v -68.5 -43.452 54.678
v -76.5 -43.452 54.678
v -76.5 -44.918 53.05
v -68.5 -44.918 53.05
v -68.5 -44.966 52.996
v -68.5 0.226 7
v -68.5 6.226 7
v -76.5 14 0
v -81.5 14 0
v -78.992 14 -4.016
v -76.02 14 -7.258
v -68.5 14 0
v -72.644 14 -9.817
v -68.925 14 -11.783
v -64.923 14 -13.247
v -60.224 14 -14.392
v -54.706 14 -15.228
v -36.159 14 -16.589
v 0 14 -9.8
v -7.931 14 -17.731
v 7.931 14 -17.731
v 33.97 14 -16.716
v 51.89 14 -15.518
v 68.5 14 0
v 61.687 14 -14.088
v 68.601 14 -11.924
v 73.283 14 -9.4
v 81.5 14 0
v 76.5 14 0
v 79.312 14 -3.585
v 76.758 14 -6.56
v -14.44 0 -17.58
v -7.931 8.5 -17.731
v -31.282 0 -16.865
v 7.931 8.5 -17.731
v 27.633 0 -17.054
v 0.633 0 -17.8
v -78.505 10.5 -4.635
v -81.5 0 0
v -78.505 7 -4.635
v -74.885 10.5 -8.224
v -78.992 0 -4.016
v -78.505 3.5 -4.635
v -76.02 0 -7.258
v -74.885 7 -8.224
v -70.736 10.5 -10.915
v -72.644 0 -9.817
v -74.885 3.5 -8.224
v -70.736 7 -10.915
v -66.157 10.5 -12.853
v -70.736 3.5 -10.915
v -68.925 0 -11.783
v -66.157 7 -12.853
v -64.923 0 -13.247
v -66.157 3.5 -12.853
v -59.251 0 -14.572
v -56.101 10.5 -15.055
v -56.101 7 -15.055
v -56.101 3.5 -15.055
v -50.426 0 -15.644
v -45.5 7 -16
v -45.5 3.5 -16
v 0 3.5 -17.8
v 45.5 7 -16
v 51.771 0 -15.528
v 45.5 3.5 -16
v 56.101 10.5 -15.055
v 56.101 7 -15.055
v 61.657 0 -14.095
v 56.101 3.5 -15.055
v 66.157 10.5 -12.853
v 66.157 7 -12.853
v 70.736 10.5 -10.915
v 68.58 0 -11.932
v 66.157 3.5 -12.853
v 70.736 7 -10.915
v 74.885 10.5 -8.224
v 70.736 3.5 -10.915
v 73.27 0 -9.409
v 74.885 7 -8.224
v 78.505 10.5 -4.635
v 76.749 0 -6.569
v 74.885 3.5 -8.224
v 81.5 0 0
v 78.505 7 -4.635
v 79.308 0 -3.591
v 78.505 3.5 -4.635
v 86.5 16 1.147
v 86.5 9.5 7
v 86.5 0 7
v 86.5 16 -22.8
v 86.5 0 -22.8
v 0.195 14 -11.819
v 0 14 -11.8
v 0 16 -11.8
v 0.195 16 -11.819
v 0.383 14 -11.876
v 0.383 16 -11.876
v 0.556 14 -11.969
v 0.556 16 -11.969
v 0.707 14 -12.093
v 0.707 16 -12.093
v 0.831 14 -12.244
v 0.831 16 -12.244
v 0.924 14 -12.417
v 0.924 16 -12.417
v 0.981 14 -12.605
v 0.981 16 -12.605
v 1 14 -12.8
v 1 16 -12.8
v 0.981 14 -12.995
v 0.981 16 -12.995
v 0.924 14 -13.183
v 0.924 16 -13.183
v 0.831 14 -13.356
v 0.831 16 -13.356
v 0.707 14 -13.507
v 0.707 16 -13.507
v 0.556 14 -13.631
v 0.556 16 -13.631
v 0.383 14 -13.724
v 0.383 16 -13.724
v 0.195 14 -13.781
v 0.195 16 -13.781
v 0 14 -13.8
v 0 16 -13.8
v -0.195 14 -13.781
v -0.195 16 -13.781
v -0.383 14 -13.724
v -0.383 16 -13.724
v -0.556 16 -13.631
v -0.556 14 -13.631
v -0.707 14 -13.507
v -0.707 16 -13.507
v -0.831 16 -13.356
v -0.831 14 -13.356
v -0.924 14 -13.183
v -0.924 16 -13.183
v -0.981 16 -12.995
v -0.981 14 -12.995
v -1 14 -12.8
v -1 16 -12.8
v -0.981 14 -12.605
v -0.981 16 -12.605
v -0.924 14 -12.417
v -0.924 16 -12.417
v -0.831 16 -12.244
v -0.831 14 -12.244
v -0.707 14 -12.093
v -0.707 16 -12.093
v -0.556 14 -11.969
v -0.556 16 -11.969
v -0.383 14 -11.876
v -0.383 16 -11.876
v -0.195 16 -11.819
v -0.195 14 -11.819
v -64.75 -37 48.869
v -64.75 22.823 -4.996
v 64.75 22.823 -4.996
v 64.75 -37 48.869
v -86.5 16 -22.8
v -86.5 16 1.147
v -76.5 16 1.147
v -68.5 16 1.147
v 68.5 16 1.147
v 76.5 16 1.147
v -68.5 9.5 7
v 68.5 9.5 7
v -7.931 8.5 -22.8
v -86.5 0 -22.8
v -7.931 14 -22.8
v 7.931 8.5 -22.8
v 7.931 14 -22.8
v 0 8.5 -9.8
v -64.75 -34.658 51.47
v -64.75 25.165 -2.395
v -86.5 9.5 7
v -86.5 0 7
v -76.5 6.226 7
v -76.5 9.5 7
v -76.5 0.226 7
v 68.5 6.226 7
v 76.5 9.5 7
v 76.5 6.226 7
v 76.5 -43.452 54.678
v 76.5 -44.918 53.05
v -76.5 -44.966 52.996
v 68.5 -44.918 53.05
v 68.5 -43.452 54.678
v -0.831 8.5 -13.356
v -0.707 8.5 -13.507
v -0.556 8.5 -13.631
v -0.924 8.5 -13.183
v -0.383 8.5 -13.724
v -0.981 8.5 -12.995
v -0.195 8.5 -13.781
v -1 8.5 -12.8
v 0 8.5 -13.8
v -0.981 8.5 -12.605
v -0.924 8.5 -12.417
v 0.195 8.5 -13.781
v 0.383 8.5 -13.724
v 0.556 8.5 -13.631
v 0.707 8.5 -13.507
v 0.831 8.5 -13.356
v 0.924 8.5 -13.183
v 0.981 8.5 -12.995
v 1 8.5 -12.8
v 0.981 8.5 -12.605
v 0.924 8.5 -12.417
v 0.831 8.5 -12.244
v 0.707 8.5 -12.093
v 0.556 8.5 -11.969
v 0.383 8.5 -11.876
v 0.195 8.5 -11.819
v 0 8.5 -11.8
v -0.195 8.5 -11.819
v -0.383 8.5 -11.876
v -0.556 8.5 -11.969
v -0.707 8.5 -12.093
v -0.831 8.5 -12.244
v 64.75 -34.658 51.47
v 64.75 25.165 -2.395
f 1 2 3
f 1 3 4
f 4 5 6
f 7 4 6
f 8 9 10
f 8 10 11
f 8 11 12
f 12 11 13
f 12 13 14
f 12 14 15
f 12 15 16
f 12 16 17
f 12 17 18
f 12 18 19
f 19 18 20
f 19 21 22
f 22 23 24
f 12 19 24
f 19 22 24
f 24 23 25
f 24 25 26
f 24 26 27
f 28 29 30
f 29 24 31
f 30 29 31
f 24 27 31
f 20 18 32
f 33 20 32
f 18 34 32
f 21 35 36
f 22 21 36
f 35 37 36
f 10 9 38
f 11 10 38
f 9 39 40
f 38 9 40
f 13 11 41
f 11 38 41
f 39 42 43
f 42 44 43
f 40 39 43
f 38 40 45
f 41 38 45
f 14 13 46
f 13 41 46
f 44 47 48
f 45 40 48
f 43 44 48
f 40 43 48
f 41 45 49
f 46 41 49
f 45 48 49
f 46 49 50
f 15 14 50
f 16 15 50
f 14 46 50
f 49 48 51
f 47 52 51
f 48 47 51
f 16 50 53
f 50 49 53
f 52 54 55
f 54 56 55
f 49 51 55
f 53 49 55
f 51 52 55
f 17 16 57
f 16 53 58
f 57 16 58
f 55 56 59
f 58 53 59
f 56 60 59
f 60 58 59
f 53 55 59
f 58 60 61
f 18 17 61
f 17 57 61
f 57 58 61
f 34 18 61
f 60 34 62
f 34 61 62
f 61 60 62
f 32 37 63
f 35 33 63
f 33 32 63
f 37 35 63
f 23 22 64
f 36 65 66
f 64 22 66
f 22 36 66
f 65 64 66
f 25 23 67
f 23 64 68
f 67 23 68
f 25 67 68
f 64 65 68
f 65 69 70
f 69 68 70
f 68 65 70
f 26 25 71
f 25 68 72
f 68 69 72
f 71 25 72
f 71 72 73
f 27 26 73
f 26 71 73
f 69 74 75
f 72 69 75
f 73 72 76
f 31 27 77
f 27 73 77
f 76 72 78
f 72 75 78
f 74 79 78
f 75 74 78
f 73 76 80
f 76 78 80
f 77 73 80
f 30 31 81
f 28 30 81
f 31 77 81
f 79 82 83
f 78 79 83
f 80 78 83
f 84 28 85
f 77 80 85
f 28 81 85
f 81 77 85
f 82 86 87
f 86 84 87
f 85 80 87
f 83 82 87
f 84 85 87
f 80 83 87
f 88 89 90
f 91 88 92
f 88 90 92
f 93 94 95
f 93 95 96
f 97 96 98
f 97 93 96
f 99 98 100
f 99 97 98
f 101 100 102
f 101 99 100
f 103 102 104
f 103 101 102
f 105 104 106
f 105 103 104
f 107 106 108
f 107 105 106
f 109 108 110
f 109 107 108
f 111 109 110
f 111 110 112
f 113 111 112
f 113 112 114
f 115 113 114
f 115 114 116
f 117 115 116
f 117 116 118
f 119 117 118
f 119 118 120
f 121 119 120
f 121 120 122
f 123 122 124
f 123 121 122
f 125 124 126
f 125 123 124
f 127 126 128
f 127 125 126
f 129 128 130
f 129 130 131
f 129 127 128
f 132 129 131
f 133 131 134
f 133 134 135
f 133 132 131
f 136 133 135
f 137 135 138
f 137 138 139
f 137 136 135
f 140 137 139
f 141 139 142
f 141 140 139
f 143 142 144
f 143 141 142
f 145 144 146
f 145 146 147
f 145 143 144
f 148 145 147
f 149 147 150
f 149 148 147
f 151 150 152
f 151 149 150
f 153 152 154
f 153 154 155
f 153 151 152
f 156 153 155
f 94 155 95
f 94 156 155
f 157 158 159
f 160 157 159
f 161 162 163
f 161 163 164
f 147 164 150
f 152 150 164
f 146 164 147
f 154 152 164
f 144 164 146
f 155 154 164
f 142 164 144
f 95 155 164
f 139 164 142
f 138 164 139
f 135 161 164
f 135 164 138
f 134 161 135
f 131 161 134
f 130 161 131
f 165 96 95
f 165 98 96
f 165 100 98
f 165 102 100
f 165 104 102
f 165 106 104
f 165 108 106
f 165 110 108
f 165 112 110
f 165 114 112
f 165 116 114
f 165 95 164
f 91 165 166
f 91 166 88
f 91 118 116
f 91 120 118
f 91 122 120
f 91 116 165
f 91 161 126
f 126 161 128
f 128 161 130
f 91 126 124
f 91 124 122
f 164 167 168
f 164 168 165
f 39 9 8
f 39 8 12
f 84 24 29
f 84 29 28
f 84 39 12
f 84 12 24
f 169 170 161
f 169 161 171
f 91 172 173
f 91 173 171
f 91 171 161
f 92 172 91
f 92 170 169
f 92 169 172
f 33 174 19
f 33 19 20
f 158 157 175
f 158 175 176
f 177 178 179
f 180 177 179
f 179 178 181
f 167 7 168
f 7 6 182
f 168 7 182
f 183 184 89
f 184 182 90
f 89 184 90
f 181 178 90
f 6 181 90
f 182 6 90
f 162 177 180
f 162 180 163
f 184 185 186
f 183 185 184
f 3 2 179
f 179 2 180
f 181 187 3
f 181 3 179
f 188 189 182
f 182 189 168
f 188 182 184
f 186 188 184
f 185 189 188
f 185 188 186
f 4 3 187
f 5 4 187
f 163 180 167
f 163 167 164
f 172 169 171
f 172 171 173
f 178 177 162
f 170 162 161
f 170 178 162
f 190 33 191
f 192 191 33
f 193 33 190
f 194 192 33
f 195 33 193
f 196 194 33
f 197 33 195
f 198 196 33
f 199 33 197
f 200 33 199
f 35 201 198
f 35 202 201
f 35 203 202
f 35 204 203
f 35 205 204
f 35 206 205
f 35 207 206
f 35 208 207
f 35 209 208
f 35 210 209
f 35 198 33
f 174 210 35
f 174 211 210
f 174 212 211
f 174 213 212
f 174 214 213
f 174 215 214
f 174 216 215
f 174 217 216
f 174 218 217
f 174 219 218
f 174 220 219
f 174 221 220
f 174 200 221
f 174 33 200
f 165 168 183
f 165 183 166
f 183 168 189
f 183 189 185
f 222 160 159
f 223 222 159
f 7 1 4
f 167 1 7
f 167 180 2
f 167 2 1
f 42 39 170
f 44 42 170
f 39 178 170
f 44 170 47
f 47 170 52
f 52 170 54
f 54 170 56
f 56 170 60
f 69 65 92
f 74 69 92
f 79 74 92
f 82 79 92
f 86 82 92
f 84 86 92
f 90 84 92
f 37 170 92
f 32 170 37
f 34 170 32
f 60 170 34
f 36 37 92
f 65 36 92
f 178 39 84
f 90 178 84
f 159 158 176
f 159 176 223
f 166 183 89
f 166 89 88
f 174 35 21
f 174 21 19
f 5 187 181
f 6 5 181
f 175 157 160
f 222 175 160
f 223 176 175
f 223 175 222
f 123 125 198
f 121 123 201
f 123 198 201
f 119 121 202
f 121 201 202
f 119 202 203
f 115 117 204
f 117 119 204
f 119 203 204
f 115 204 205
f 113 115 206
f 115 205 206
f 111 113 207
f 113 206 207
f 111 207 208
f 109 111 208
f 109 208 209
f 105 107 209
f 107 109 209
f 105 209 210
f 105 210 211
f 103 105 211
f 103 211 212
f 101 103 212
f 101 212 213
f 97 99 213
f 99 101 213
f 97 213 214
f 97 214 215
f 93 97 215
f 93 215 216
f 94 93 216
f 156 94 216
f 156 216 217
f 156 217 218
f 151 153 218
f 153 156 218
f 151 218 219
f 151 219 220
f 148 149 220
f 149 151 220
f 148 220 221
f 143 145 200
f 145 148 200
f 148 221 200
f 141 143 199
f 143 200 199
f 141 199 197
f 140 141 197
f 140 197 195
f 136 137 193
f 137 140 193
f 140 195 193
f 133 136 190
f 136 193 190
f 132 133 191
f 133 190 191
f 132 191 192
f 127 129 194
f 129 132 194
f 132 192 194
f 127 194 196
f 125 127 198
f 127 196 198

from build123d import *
from build123d.topology import SkipClean

# Parameters (mm, degrees)
SKETCH2_W               = 173
SKETCH2_H               = 29.8
BOSS_EXTRUDE1_DEPTH     = 14
SKETCH4_W               = 173
SKETCH4_H               = 29.8
SKETCH4_R               = 1
BOSS_EXTRUDE3_DEPTH     = 2
BOSS_EXTRUDE4_START     = 5.5
SKETCH5_R               = 1
BOSS_EXTRUDE4_DEPTH     = 5.5
CUT_EXTRUDE1_DEPTH      = 91.874033815
CUT_EXTRUDE1_DEPTH_BACK = 91.874033815
SKETCH7_W               = 129.5
SKETCH7_H               = 80.5
BOSS_EXTRUDE5_DEPTH     = 3.5
SKETCH8_W               = 8
SKETCH8_H               = 80
BOSS_EXTRUDE6_DEPTH     = 2.190926
CHAMFER1_START          = -76.5
CHAMFER1_DEPTH          = 8


with BuildPart() as part:
    # Sketch2 → Boss-Extrude1 (new body)
    with BuildSketch(Plane(origin=(0, 0, 0), x_dir=(1, 0, 0), z_dir=(0, 1, 0))):
        with Locations((0, 7.9)):
            Rectangle(SKETCH2_W, SKETCH2_H)
        with BuildLine():
            Line((-81.5, 0), (81.5, 0))
            add(Edge.make_bspline(
                [(-81.5, 0), (-74.436091259, 13.881927863), (-43.259356961, 16.362188276), (0, 18.555927536), (43.259356961, 16.362188276), (74.436091259, 13.881927863), (81.5, 0)],
                knots=[0, 0, 0, 0, 0.237125688, 0.5, 0.762874312, 1, 1, 1, 1], degree=3))
        make_face(mode=Mode.SUBTRACT)
    extrude(amount=BOSS_EXTRUDE1_DEPTH)

    # Sketch4 → Boss-Extrude3 (add)
    with BuildSketch(Plane(origin=(0, 14, 0), x_dir=(1, 0, 0), z_dir=(0, 1, 0))):
        with Locations((0, 7.9)):
            Rectangle(SKETCH4_W, SKETCH4_H)
        with Locations(Location((0, 12.8, 0), (0, 0, 270))):
            Circle(SKETCH4_R, mode=Mode.SUBTRACT)
    extrude(amount=BOSS_EXTRUDE3_DEPTH)

    # Sketch5 → Boss-Extrude4 (add)
    with SkipClean():  # the faces are left unmerged after this step: merging them gives an invalid solid
        with BuildSketch(Plane.XZ.offset(-14).offset(BOSS_EXTRUDE4_START)):
            Polygon((0, -9.8), (-7.931348641, -17.731348641), (-7.931348641, -22.8), (7.931348641, -22.8), (7.931348641, -17.731348641), align=None)
            with Locations(Location((0, -12.8, 0), (0, 0, 270))):
                Circle(SKETCH5_R, mode=Mode.SUBTRACT)
        extrude(amount=-BOSS_EXTRUDE4_DEPTH)

    # Sketch3 → Cut-Extrude1 (cut, two sides: drawn at the far end of the back side and taken through both)
    with SkipClean():  # the faces are left unmerged after this step: merging them gives an invalid solid
        with BuildSketch(Plane(origin=(0, 0, 0), x_dir=(0, 0, -1), z_dir=(1, 0, 0)).offset(-CUT_EXTRUDE1_DEPTH_BACK)):
            Polygon((-48.86878806, -37), (4.996225752, 22.823158451), (1.280501625, 26.168811483), (-52.584512187, -33.654346968), align=None)
        extrude(amount=CUT_EXTRUDE1_DEPTH + CUT_EXTRUDE1_DEPTH_BACK, mode=Mode.SUBTRACT)

    # Sketch8 → Boss-Extrude6 (add)
    with SkipClean():  # the faces are left unmerged after this step: merging them gives an invalid solid
        with BuildSketch(Plane(origin=(0, 7.734316433, 8.589828624), x_dir=(1, 0, 0), z_dir=(0, 0.669130606358862, 0.7431448254773908))):
            with Locations((-72.5, -28.87742566)):
                Rectangle(SKETCH8_W, SKETCH8_H)
            with Locations((72.5, -28.87742566)):
                Rectangle(SKETCH8_W, SKETCH8_H)
        extrude(amount=-BOSS_EXTRUDE6_DEPTH)

    # Chamfer1: read off the stored shape, not the designer's step
    # Chamfer1 outline → Chamfer1 (add)
    with SkipClean():  # the faces are left unmerged after this step: merging them gives an invalid solid
        with BuildSketch(Plane.YZ.offset(CHAMFER1_START)):
            Polygon((-44.917601714, 53.049646864), (-44.965963009, 52.995936205), (0.225712396, 7), (6.225712396, 7), align=None)
        extrude(amount=CHAMFER1_DEPTH)


with BuildPart() as body_2:
    # Sketch7 → Boss-Extrude5 (new body)
    with BuildSketch(Plane(origin=(0, 7.734316433, 8.589828624), x_dir=(1, 0, 0), z_dir=(0, 0.6691306063588622, 0.7431448254773908))):
        with Locations((0, -19.945960329)):
            Rectangle(SKETCH7_W, SKETCH7_H)
    extrude(amount=BOSS_EXTRUDE5_DEPTH)


solid = Compound([part.part, body_2.part])
